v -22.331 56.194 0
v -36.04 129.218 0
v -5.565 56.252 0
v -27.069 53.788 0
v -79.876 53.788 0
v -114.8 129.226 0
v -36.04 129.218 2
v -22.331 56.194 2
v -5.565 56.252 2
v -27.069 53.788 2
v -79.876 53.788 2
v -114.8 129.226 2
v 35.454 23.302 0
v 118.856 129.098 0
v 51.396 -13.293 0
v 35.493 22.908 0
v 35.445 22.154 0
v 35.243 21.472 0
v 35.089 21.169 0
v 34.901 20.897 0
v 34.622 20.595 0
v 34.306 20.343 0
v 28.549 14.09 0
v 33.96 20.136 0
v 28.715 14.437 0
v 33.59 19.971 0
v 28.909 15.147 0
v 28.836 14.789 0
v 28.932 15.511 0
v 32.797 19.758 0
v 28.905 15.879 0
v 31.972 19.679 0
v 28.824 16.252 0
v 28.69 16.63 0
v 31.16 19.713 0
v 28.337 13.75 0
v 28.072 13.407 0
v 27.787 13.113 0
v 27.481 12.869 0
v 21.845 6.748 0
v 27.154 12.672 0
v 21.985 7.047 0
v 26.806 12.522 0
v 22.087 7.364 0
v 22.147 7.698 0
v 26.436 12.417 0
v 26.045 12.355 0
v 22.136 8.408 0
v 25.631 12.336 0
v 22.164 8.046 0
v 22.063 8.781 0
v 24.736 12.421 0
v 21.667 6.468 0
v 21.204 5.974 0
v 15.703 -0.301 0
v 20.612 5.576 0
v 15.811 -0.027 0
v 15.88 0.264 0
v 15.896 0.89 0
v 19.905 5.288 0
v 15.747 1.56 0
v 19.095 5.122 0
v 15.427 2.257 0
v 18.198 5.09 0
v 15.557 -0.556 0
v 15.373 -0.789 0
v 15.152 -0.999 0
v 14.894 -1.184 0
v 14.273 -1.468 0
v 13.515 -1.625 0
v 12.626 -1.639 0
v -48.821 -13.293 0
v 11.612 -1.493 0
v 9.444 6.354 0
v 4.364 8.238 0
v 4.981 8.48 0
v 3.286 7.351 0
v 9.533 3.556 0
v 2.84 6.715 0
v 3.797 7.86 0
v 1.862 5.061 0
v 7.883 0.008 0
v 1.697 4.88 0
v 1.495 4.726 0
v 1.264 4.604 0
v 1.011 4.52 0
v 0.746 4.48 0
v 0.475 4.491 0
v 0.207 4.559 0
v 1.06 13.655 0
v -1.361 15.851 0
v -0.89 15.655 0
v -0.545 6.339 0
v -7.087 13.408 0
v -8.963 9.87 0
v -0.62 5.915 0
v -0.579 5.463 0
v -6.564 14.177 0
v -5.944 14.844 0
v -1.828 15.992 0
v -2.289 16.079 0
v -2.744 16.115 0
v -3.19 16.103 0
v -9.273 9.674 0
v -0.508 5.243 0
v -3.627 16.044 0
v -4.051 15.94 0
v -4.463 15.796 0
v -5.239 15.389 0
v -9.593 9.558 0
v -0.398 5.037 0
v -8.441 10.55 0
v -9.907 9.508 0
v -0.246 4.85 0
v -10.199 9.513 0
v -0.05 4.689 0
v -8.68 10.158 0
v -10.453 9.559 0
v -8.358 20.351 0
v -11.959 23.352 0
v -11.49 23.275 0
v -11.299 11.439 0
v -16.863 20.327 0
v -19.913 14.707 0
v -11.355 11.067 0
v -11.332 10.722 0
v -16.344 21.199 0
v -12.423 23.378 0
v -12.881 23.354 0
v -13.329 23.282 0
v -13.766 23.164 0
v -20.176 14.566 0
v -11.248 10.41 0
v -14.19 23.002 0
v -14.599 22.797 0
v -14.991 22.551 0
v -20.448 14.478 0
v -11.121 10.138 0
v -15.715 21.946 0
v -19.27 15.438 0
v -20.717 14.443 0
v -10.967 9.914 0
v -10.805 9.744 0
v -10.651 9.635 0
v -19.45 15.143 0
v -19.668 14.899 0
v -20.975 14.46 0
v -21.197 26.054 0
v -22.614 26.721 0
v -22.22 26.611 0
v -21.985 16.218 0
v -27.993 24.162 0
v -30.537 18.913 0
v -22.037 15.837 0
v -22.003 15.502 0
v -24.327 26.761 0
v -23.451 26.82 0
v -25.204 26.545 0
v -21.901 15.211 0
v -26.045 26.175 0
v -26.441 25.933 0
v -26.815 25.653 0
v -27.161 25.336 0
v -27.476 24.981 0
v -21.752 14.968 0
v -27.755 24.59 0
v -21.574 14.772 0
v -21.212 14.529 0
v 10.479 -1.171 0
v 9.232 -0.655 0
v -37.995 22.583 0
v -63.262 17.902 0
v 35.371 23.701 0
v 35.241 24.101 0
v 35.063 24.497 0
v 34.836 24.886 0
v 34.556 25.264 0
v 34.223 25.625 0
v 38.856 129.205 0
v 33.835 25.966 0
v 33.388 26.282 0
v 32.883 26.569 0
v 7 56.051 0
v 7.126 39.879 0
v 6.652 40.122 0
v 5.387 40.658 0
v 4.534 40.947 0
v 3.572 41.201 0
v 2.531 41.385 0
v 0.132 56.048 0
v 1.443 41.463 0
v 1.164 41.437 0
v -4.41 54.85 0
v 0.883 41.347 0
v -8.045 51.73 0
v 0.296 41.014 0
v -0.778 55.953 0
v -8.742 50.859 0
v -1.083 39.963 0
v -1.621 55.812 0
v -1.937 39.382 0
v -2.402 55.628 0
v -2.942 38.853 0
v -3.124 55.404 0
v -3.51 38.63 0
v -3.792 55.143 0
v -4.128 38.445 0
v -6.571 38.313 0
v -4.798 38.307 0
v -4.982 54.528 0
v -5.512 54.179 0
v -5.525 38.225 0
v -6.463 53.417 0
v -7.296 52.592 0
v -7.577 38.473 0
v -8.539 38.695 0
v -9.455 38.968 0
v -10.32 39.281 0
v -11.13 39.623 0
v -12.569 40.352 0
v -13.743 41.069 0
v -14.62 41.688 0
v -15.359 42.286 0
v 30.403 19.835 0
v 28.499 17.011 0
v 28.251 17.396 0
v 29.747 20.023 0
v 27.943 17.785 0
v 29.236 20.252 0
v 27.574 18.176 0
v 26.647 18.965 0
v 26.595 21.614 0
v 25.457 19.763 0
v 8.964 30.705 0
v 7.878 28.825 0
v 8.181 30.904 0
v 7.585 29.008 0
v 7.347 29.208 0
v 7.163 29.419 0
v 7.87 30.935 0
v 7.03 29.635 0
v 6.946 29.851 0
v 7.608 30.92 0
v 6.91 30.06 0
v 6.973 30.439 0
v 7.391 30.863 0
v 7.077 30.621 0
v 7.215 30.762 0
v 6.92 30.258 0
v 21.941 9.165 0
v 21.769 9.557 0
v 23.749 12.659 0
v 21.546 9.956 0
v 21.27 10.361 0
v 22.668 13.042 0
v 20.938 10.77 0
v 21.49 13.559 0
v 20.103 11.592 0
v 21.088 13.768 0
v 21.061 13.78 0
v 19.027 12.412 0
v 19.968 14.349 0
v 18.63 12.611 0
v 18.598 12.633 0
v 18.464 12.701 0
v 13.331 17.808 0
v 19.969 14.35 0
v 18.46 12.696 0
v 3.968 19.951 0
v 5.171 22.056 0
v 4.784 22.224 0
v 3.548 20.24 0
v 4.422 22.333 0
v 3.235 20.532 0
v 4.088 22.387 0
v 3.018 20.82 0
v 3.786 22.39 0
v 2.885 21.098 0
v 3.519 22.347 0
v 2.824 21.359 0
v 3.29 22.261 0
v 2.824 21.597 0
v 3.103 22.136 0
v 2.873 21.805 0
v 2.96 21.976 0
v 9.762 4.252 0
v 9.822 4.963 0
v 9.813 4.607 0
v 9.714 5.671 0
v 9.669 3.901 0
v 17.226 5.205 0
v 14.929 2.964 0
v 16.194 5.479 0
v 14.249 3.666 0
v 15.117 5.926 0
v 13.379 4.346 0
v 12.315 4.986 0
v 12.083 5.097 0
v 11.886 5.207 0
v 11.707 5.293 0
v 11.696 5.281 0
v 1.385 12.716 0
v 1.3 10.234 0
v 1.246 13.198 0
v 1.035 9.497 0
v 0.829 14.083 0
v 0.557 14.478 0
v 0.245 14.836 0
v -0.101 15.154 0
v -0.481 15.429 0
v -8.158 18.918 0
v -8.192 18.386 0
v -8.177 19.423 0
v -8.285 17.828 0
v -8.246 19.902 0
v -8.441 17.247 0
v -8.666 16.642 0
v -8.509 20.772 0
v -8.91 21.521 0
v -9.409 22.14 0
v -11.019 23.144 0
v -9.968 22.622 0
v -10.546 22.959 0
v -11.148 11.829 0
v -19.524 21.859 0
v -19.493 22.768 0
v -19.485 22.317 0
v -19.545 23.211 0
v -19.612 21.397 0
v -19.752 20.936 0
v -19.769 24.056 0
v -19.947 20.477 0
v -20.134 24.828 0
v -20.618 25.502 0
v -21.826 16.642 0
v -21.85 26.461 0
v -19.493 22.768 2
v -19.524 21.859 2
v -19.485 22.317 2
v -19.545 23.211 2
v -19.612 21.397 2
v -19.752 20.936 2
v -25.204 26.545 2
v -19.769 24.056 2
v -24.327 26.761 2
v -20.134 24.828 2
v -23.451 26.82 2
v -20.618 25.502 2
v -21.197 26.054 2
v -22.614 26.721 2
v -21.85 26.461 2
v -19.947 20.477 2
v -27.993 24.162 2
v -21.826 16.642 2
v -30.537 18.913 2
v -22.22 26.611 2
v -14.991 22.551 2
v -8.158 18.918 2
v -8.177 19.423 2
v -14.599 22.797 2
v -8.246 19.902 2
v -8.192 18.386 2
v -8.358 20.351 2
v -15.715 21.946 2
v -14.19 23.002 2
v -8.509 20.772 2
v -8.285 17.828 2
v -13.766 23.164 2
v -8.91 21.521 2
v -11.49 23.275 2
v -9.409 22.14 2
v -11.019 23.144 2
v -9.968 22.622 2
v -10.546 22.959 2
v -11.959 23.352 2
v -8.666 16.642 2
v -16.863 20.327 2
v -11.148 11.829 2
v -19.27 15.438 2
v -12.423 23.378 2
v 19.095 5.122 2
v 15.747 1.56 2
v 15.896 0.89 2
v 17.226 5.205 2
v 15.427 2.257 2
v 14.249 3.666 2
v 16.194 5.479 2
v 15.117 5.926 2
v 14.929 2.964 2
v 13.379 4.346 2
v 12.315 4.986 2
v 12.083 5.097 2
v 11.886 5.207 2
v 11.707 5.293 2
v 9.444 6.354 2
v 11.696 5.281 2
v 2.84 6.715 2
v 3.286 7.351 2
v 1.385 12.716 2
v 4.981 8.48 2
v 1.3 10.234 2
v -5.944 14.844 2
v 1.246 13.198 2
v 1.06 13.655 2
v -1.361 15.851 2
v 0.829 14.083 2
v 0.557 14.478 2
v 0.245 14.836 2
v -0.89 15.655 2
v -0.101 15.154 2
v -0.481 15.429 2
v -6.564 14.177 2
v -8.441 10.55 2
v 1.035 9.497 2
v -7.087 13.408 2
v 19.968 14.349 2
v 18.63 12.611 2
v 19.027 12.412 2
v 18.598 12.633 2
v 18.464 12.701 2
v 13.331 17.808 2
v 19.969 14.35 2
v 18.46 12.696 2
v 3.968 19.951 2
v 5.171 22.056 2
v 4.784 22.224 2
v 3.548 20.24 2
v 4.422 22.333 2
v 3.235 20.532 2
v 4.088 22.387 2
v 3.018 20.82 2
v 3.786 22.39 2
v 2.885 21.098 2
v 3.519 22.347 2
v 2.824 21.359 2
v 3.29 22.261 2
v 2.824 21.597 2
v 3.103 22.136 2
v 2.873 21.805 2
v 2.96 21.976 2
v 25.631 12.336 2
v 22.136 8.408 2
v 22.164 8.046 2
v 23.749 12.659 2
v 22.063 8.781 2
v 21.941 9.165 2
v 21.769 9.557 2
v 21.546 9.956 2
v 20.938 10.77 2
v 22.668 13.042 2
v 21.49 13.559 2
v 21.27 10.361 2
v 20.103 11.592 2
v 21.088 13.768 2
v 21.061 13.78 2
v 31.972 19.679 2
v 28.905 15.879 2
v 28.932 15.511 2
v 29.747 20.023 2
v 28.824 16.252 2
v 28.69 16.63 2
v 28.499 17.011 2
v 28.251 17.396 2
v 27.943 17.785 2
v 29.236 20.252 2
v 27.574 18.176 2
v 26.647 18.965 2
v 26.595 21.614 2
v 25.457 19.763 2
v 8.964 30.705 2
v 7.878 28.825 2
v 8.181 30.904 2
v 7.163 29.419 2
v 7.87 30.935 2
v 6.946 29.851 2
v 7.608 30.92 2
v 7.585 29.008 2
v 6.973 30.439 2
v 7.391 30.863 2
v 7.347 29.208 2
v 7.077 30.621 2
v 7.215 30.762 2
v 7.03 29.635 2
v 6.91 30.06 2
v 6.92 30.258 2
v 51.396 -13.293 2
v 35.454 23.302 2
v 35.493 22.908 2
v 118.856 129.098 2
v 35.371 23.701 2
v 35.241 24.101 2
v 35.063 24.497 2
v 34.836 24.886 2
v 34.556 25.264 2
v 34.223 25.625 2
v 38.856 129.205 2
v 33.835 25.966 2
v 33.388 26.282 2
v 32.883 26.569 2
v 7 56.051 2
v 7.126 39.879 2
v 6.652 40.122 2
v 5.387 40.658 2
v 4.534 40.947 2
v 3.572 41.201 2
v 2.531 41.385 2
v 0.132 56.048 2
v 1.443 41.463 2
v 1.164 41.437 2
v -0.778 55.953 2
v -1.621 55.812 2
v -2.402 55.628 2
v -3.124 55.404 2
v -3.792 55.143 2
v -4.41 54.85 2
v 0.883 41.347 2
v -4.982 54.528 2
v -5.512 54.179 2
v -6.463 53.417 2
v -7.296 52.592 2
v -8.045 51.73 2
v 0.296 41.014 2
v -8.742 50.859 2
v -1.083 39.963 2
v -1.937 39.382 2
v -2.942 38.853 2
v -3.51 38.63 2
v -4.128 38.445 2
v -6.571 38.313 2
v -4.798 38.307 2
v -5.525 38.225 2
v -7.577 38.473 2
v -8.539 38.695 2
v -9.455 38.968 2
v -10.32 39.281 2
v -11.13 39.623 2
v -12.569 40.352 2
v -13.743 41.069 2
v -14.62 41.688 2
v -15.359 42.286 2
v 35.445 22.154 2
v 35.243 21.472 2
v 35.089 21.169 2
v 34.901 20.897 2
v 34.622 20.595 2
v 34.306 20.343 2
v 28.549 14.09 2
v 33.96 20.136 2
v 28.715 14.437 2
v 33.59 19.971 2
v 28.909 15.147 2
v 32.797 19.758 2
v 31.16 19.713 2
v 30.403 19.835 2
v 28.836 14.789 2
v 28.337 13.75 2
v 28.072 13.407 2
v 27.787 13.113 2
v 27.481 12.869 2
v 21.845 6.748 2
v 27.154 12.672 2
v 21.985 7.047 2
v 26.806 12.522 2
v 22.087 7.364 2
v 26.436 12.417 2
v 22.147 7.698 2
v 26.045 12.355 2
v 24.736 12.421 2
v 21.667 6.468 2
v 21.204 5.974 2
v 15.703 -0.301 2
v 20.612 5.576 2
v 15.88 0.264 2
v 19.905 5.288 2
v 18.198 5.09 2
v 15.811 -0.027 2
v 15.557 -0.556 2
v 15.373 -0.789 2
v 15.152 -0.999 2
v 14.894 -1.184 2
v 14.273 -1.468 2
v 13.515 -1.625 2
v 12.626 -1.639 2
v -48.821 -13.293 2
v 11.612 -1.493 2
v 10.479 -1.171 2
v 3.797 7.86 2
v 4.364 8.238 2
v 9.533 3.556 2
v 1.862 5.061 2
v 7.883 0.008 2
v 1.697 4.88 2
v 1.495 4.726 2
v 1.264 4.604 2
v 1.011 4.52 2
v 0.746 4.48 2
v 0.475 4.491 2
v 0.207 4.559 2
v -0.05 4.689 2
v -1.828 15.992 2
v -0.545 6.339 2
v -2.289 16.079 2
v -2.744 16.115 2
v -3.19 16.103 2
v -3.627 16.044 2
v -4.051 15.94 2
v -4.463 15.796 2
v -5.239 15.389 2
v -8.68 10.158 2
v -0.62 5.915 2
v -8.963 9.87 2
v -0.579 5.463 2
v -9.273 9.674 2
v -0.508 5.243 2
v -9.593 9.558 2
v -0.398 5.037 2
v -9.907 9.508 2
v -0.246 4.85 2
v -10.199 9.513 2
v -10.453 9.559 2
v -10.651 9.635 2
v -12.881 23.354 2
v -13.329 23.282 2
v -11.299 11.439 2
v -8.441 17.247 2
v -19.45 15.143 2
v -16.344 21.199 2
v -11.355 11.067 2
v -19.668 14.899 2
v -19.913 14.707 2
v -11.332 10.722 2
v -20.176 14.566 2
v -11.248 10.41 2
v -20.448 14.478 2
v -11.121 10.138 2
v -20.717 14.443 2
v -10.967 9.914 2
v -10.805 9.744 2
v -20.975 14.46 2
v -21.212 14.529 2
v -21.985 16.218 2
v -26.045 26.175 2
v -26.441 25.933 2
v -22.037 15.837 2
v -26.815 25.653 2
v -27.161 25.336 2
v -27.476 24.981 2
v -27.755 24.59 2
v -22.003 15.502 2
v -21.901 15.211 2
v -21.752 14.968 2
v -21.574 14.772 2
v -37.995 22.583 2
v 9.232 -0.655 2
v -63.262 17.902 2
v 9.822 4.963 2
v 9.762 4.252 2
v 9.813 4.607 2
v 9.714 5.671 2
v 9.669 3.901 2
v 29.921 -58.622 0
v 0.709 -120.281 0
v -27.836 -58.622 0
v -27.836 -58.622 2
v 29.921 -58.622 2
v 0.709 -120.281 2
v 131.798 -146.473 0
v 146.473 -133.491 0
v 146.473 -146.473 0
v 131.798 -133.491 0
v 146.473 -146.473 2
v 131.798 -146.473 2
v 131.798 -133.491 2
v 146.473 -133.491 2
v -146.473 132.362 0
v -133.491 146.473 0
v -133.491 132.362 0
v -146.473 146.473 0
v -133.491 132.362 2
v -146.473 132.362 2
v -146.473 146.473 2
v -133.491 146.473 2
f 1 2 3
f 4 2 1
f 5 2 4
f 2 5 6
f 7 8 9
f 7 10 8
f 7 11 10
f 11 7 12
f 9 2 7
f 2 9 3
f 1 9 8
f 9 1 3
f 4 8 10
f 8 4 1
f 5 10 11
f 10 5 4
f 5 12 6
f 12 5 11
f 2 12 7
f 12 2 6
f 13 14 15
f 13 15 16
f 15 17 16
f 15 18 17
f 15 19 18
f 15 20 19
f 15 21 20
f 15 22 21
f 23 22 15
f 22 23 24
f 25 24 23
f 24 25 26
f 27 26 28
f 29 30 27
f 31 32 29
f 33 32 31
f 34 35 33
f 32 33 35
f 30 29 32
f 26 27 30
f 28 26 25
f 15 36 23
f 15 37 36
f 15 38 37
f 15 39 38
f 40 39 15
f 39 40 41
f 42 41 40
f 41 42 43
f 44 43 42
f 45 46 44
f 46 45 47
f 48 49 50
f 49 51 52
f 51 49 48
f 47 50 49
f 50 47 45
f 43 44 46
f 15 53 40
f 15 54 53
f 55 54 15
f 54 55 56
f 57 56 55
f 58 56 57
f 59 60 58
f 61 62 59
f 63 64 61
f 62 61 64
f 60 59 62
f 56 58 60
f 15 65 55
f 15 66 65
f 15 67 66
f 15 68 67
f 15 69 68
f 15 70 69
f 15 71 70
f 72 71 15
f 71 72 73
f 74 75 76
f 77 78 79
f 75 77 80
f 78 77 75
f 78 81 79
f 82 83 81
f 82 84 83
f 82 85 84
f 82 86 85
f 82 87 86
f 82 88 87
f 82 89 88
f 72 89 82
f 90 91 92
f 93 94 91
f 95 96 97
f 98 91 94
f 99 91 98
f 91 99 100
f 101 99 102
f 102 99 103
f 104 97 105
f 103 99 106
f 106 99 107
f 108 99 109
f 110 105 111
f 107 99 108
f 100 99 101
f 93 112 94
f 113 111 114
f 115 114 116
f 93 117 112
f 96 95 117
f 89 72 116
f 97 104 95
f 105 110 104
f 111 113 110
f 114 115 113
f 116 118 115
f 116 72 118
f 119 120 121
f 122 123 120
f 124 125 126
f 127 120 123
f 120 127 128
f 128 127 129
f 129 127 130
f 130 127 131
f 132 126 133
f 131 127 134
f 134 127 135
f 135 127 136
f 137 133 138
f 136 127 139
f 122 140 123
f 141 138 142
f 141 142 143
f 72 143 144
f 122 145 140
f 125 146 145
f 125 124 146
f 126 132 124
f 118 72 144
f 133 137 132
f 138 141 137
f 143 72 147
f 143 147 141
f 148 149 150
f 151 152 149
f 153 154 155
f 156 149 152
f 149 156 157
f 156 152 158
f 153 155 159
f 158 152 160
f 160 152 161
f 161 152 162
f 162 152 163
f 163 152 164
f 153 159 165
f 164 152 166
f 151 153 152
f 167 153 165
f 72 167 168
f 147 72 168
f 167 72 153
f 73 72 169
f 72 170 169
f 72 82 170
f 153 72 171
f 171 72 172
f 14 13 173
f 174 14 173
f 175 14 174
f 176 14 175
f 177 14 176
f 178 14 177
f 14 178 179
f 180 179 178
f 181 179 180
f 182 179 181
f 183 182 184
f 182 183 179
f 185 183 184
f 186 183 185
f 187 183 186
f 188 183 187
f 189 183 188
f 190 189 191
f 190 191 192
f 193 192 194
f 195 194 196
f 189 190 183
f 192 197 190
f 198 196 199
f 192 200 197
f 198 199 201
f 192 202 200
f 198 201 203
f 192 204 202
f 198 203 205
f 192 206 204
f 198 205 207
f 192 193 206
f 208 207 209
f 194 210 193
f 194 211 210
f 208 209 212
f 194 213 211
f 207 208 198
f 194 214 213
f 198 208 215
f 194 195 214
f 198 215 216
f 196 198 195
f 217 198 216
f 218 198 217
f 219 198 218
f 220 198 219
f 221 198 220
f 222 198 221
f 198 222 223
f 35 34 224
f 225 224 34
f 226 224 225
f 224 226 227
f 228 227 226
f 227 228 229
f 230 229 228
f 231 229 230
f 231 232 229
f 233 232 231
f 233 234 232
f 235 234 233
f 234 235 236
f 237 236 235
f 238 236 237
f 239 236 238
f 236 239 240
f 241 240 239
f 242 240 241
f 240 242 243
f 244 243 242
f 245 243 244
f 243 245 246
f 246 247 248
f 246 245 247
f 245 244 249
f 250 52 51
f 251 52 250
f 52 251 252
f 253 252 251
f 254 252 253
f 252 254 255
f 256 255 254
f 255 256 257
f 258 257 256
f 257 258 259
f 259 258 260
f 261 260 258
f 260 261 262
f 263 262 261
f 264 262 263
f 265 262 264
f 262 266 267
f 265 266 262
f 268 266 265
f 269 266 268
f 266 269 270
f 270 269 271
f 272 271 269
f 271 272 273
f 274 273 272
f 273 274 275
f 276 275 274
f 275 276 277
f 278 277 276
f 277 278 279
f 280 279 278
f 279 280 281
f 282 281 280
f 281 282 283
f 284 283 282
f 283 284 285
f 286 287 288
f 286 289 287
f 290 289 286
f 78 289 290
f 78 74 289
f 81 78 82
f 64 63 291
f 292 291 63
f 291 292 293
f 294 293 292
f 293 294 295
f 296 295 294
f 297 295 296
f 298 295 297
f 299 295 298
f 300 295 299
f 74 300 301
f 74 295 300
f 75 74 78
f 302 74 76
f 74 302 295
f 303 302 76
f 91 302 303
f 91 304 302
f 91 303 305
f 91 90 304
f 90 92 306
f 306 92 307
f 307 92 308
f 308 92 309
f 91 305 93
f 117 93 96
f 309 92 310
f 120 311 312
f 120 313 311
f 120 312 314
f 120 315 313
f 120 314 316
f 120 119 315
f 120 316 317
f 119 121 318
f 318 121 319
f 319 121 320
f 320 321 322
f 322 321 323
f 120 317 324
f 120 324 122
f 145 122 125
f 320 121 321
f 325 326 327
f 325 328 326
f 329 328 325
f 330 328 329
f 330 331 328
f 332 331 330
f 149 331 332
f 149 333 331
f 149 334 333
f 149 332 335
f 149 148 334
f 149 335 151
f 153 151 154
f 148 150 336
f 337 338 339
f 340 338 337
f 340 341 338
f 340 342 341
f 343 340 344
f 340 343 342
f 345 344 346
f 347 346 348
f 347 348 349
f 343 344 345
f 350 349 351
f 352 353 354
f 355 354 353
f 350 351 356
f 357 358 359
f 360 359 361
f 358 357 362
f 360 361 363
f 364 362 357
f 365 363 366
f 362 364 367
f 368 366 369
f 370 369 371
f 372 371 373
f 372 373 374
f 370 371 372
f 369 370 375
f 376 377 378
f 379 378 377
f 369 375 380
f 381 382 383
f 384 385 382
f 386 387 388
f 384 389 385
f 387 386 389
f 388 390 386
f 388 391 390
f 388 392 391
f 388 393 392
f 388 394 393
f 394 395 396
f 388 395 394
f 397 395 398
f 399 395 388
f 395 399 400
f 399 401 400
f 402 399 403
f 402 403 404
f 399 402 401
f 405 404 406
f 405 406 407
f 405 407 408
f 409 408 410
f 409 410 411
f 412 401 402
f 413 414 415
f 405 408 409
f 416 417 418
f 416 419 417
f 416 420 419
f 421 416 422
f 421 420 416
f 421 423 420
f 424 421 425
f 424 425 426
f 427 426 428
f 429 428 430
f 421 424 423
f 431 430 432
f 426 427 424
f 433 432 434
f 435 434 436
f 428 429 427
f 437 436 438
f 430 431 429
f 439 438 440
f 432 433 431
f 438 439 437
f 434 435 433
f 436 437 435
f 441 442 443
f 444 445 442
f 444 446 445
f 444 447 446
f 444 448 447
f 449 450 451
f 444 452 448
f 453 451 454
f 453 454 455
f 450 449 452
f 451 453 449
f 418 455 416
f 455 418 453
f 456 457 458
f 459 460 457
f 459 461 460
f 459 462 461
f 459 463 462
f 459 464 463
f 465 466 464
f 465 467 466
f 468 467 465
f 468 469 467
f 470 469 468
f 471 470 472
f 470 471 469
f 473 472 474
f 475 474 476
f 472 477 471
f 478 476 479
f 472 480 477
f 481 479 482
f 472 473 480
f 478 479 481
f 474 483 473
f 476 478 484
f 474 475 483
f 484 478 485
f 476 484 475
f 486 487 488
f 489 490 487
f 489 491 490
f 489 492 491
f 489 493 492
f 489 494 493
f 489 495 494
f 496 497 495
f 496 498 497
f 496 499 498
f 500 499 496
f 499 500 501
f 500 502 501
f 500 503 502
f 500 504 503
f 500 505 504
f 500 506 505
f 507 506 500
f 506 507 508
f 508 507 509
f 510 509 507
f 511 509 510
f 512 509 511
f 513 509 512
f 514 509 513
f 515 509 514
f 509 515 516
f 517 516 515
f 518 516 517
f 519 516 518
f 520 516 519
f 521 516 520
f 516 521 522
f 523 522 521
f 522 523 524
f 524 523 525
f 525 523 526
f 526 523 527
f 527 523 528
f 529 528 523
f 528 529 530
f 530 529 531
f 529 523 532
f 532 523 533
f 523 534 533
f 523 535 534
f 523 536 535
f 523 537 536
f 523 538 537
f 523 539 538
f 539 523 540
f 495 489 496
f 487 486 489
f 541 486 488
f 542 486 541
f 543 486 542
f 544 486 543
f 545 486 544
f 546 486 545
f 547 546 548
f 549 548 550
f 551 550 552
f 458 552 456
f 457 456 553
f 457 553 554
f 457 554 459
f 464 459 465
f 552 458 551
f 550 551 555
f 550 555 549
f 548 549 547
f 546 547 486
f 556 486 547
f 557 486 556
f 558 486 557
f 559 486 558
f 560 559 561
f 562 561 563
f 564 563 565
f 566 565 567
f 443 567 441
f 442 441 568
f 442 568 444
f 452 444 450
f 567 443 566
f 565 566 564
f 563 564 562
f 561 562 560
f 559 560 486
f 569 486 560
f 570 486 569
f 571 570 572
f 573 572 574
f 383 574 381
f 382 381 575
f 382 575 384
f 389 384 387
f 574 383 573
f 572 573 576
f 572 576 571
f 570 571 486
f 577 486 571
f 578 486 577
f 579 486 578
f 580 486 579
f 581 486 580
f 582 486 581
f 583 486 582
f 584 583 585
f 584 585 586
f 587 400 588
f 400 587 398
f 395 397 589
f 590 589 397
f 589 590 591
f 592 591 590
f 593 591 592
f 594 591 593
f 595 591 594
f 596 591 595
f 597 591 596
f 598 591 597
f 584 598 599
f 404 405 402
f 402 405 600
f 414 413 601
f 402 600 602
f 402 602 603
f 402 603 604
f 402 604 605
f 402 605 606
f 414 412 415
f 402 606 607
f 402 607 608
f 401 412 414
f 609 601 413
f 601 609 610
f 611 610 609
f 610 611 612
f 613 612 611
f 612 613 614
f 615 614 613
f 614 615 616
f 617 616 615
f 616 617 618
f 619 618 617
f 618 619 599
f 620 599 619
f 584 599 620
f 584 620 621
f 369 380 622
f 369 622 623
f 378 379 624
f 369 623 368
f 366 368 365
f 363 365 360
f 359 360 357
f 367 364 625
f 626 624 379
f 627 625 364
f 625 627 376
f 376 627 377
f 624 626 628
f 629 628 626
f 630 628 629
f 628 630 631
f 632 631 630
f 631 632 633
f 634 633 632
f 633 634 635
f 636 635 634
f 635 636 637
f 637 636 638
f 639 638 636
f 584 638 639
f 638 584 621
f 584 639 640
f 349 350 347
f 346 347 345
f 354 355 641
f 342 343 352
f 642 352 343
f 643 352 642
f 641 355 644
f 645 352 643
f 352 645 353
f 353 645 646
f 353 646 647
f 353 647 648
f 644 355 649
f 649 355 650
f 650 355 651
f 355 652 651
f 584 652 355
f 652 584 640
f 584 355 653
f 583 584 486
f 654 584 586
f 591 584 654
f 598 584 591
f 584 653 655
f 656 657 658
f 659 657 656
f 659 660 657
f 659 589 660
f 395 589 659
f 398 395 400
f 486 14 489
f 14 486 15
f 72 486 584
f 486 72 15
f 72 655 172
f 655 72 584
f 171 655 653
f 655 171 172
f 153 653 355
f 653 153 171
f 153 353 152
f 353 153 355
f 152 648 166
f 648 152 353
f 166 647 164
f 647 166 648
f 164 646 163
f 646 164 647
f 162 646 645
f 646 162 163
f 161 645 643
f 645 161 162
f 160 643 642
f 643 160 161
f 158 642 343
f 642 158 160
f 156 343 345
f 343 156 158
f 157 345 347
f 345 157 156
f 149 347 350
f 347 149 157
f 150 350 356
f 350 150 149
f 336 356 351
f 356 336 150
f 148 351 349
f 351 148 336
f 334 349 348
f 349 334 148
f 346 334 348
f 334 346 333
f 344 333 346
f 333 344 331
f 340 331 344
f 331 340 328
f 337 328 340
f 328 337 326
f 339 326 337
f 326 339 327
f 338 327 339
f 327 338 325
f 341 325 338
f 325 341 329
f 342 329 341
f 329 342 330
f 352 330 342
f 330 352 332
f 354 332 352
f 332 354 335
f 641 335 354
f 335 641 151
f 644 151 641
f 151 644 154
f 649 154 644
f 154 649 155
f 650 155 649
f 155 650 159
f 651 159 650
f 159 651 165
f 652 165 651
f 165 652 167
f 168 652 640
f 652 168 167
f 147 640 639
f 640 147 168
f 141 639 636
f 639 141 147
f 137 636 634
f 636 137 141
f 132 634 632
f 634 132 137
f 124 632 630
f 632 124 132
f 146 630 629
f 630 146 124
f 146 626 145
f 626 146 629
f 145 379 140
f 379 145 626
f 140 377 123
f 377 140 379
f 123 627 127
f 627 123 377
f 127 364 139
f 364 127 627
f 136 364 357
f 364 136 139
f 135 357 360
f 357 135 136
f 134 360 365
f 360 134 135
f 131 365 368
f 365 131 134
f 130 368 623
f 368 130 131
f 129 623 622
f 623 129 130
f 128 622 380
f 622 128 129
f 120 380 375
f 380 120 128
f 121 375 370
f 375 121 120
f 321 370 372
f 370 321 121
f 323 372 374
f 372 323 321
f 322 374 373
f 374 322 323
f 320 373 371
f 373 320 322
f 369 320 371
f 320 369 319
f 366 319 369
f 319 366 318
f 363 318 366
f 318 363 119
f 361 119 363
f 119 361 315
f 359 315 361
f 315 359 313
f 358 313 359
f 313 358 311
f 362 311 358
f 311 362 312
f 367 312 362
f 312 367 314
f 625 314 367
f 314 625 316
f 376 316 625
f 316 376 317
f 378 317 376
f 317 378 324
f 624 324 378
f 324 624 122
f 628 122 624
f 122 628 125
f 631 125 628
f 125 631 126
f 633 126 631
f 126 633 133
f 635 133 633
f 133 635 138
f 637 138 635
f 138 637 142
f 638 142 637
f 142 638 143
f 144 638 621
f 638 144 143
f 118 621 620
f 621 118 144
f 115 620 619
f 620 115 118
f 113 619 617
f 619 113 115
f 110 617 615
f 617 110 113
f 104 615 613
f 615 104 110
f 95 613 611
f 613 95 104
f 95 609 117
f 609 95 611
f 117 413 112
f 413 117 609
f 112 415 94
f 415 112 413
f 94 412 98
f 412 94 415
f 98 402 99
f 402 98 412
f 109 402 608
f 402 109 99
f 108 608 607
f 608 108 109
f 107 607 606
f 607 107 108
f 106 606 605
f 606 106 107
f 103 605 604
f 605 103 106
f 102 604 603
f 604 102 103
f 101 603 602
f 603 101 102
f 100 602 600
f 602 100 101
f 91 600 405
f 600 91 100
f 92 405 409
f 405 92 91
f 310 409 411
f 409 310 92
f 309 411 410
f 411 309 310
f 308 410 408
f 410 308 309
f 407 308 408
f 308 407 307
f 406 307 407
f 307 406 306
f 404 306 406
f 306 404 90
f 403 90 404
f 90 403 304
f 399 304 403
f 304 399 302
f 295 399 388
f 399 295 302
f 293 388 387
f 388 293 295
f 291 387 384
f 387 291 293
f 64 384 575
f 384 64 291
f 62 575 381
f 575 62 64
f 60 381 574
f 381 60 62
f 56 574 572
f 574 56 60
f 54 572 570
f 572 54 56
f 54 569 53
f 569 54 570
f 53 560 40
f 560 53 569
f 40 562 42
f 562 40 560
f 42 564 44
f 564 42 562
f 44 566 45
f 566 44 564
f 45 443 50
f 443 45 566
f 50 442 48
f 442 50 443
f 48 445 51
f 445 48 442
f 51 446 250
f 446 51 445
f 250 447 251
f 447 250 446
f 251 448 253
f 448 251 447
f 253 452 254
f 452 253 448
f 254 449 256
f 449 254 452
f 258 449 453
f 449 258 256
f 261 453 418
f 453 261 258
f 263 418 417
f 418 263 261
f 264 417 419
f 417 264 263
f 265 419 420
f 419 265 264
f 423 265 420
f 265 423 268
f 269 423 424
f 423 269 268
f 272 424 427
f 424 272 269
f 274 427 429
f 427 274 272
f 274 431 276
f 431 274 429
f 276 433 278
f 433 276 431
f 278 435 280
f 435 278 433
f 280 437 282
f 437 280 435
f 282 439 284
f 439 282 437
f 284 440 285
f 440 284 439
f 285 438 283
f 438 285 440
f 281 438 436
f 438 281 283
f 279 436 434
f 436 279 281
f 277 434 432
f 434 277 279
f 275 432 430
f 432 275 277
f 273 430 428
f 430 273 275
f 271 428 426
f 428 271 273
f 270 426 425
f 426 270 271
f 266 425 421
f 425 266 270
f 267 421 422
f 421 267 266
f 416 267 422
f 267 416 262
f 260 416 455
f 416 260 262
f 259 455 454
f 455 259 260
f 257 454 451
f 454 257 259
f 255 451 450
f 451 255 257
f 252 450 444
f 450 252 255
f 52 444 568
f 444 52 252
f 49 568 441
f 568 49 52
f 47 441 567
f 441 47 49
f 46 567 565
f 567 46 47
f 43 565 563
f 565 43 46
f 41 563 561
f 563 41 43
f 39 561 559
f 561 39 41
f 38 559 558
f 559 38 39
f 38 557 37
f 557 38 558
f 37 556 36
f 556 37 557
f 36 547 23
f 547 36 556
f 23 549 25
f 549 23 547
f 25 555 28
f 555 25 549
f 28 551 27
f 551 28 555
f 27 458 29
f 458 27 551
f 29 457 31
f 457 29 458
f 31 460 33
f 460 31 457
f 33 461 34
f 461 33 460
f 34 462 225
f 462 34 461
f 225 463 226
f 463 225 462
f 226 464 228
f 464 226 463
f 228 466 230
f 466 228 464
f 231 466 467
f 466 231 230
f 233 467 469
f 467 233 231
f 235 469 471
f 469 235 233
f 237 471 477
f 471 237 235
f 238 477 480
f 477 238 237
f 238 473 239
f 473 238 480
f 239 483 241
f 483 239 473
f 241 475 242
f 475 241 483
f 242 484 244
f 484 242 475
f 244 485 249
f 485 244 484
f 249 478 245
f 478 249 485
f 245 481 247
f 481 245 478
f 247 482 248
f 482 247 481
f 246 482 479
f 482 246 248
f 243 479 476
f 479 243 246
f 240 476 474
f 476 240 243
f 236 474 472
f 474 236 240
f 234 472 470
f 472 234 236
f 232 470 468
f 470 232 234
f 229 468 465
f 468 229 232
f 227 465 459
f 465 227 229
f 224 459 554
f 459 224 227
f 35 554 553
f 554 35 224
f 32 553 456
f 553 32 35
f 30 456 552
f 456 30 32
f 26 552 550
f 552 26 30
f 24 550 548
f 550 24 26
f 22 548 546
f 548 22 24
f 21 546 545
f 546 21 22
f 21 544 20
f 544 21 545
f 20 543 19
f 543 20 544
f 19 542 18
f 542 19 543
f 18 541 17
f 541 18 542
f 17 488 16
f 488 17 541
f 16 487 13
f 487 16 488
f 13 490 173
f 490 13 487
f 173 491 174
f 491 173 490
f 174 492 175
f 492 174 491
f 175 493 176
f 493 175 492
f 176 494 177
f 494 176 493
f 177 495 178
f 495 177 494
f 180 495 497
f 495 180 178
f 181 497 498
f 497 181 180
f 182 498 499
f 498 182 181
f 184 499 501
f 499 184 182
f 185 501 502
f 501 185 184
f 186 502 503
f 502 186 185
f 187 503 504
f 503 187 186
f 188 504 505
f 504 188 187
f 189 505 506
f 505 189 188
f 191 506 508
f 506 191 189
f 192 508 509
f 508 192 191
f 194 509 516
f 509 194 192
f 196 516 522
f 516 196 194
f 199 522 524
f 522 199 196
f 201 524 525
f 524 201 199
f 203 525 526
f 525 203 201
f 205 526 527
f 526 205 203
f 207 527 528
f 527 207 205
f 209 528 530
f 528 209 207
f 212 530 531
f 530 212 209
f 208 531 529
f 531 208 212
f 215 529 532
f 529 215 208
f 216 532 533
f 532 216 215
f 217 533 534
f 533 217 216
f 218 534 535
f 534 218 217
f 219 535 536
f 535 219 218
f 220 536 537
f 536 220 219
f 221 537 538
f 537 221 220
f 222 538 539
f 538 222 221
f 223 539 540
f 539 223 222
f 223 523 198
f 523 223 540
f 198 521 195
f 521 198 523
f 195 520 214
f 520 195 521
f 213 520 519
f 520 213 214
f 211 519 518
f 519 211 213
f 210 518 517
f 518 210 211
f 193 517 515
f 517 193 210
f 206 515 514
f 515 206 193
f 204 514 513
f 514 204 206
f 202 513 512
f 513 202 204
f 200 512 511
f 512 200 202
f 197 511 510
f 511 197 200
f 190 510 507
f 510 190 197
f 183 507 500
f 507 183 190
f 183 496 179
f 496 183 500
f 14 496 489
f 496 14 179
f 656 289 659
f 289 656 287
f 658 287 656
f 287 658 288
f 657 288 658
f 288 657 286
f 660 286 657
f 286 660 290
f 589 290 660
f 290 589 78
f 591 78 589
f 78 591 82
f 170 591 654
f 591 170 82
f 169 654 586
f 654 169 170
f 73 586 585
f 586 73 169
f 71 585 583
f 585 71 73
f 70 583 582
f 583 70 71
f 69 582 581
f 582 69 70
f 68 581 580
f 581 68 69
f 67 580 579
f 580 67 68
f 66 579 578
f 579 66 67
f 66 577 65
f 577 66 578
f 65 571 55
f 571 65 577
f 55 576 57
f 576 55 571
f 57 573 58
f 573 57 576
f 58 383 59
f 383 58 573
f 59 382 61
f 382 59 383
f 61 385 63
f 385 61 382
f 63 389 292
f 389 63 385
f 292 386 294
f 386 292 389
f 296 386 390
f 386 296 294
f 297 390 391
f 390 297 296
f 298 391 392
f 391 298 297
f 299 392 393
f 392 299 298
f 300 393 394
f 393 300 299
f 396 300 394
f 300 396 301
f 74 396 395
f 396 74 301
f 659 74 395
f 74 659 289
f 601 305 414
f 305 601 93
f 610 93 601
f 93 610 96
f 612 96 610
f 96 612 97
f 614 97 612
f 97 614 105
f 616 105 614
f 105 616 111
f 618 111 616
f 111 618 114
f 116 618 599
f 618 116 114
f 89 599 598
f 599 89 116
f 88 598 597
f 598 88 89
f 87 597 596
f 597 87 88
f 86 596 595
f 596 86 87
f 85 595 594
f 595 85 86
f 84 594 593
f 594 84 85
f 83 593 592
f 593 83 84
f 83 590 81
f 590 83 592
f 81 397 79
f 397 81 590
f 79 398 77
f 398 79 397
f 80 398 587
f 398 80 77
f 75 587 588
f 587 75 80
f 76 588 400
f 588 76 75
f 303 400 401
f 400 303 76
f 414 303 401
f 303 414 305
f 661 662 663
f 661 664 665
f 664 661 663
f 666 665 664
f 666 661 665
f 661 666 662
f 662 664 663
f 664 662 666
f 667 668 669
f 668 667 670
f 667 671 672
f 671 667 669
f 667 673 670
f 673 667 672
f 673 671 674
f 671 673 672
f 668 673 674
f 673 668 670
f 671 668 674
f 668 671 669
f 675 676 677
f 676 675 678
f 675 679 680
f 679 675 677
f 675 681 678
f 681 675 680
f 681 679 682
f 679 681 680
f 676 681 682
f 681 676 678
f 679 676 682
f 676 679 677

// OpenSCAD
// Module names are of the form poly_<inkscape-path-id>().
// As a result you can associate a polygon in this OpenSCAD program with the
//  corresponding SVG element in the Inkscape document by looking for 
//  the XML element with the attribute id="inkscape-path-id".

// Paths have their own variables so they can be imported and used 
//  in polygon(points) structures in other programs.
// The NN_points is the list of all polygon XY vertices. 
// There may be an NN_paths variable as well. If it exists then it 
//  defines the nested paths. Both must be used in the 
//  polygon(points, paths) variant of the command.

profile_scale = 25.4/90; //made in inkscape in mm

// helper functions to determine the X,Y dimensions of the profiles
function min_x(shape_points) = min([ for (x = shape_points) min(x[0])]);
function max_x(shape_points) = max([ for (x = shape_points) max(x[0])]);
function min_y(shape_points) = min([ for (x = shape_points) min(x[1])]);
function max_y(shape_points) = max([ for (x = shape_points) max(x[1])]);

height = 2;
width = 1.0;


rect1031_0_points = [[467.000000,472.999998],[519.000000,472.999998],[519.000000,518.999998],[467.000000,518.999998],[467.000000,472.999998]];

module poly_rect1031(h, w, res=4)  {
  scale([profile_scale, -profile_scale, 1])
  union()  {
    linear_extrude(height=h)
      polygon(rect1031_0_points);
  }
}

rect1033_0_points = [[-519.000000,-518.999998],[-473.000000,-518.999998],[-473.000000,-468.999998],[-519.000000,-468.999998],[-519.000000,-518.999998]];

module poly_rect1033(h, w, res=4)  {
  scale([profile_scale, -profile_scale, 1])
  union()  {
    linear_extrude(height=h)
      polygon(rect1033_0_points);
  }
}

path45873_0_points = [[-406.771484,-457.888674],[-283.023440,-190.585942],[-95.912110,-190.585942],[-79.125000,-199.113282],[-19.718750,-199.316412],[-127.701170,-457.859377],[-406.771484,-457.888674],[-406.771484,-457.888674]];
path45873_1_points = [[137.679690,-457.812502],[24.802730,-198.607422],[0.468750,-198.595702],[-2.755678,-198.259616],[-5.743789,-197.758989],[-8.510245,-197.105848],[-11.069708,-196.312221],[-13.436839,-195.390137],[-15.626300,-194.351623],[-17.652753,-193.208707],[-19.530859,-191.973417],[-22.900676,-189.273827],[-25.853045,-186.349076],[-28.505259,-183.295387],[-30.974610,-180.208982],[-54.421880,-149.832032],[-51.804015,-147.711645],[-48.696732,-145.519071],[-44.537260,-142.978610],[-39.435630,-140.395534],[-36.565891,-139.183414],[-33.501875,-138.075119],[-30.257336,-137.108806],[-26.846027,-136.322637],[-23.281704,-135.754769],[-19.578120,-135.443362],[-17.000974,-135.735080],[-14.625291,-136.223356],[-12.437444,-136.878221],[-10.423809,-137.669709],[-6.864666,-139.542685],[-3.838850,-141.602542],[1.048837,-145.323951],[3.128727,-146.506023],[4.125377,-146.822515],[5.111330,-146.916022],[8.969288,-146.639453],[12.655323,-145.987151],[16.063878,-145.086290],[19.089399,-144.064045],[23.569108,-142.164096],[25.250000,-141.304692],[116.513670,-94.140622],[118.305030,-93.123609],[119.886092,-92.003912],[121.263512,-90.796704],[122.443942,-89.517159],[123.434038,-88.180448],[124.240452,-86.801743],[124.869839,-85.396217],[125.328854,-83.979042],[125.624149,-82.565391],[125.762379,-81.170436],[125.594261,-78.497303],[124.877730,-76.081022],[124.330446,-75.007132],[123.666020,-74.042972],[122.674652,-72.976069],[121.556677,-72.080671],[120.331704,-71.346430],[119.019340,-70.762997],[116.210872,-70.007160],[113.288136,-69.730367],[110.407998,-69.849828],[107.727320,-70.282750],[105.402966,-70.946342],[103.591800,-71.757812],[94.234380,-76.583982],[31.761720,-108.796882],[28.987165,-109.502979],[27.885413,-109.610857],[26.956581,-109.560520],[26.187595,-109.355890],[25.565382,-109.000890],[25.076868,-108.499443],[24.708980,-107.855472],[24.519990,-107.214291],[24.485759,-106.512583],[24.613140,-105.770055],[24.908986,-105.006410],[25.380149,-104.241354],[26.033480,-103.494593],[26.875833,-102.785830],[27.914060,-102.134772],[90.201170,-70.025392],[94.420218,-67.200318],[97.704423,-64.402041],[99.010637,-63.015996],[100.100754,-61.640303],[100.980645,-60.276181],[101.656180,-58.924847],[102.133231,-57.587520],[102.417669,-56.265417],[102.515365,-54.959756],[102.432190,-53.671754],[102.174015,-52.402630],[101.746711,-51.153602],[101.156149,-49.925886],[100.408200,-48.720702],[99.469106,-47.503779],[98.457905,-46.464798],[97.373551,-45.599188],[96.215000,-44.902377],[94.981205,-44.369795],[93.671122,-43.996869],[92.283707,-43.779028],[90.817913,-43.711700],[87.647009,-44.010298],[84.150052,-44.856091],[80.318679,-46.212507],[76.144530,-48.042972],[74.720700,-48.785162],[74.625000,-48.828122],[70.753910,-50.843752],[70.757810,-50.847662],[47.234380,-63.097662],[18.322270,-78.152342],[16.950985,-78.745718],[15.668369,-79.131285],[14.486093,-79.323086],[13.415826,-79.335167],[12.469241,-79.181574],[11.658008,-78.876350],[10.993797,-78.433541],[10.488280,-77.867192],[10.179627,-77.260441],[10.004877,-76.524338],[10.004929,-75.682099],[10.220677,-74.756940],[10.693021,-73.772076],[11.462856,-72.750723],[12.571080,-71.716097],[14.058590,-70.691412],[65.408200,-44.984382],[65.423830,-45.001952],[65.898440,-44.763672],[66.011720,-44.683592],[67.417970,-43.978522],[71.231043,-41.074763],[74.190109,-38.159950],[75.364801,-36.712241],[76.344484,-35.278378],[77.135322,-33.863898],[77.743481,-32.474338],[78.175123,-31.115235],[78.436415,-29.792124],[78.533519,-28.510544],[78.472600,-27.276030],[78.259823,-26.094119],[77.901352,-24.970347],[77.403351,-23.910252],[76.771985,-22.919370],[75.133813,-21.167390],[73.036151,-19.758702],[70.528313,-18.737598],[67.659614,-18.148371],[64.479369,-18.035313],[61.036892,-18.442719],[57.381497,-19.414881],[53.562500,-20.996092],[4.906250,-45.056642],[4.415967,-46.764596],[3.756412,-48.383146],[2.938357,-49.898967],[1.972577,-51.298732],[0.869845,-52.569115],[-0.359068,-53.696789],[-1.703387,-54.668427],[-3.152340,-55.470702],[-4.820709,-56.166044],[-6.475752,-56.664117],[-8.111870,-56.973109],[-9.723462,-57.101210],[-11.304929,-57.056610],[-12.850672,-56.847496],[-14.355090,-56.482059],[-15.812585,-55.968487],[-18.564404,-54.529698],[-21.061333,-52.596640],[-23.258574,-50.234827],[-25.111330,-47.509772],[-29.908200,-37.382812],[-30.756858,-35.993422],[-31.758791,-34.973720],[-32.855982,-34.279451],[-33.990415,-33.866359],[-35.104073,-33.690186],[-36.138939,-33.706677],[-37.036997,-33.871574],[-37.740230,-34.140622],[-38.285622,-34.524512],[-38.861082,-35.126735],[-39.405087,-35.922094],[-39.856115,-36.885392],[-40.152643,-37.991435],[-40.233148,-39.215025],[-40.036108,-40.530966],[-39.500000,-41.914062],[-30.707030,-58.966802],[-29.910634,-61.110659],[-29.356419,-63.171718],[-29.027140,-65.146439],[-28.905551,-67.031279],[-28.974408,-68.822697],[-29.216466,-70.517152],[-29.614479,-72.111103],[-30.151203,-73.601007],[-31.571799,-76.254512],[-33.340295,-78.449336],[-35.318729,-80.157146],[-37.369140,-81.349612],[-39.042540,-82.008011],[-40.713648,-82.470882],[-42.375113,-82.744660],[-44.019584,-82.835778],[-45.639711,-82.750669],[-47.228142,-82.495767],[-48.777526,-82.077504],[-50.280512,-81.502315],[-51.729750,-80.776632],[-53.117887,-79.906890],[-55.681457,-77.760958],[-57.912414,-75.115987],[-59.751950,-72.023442],[-68.279300,-54.703122],[-68.917787,-53.655694],[-69.689064,-52.791097],[-70.558398,-52.110035],[-71.491051,-51.613214],[-72.452290,-51.301337],[-73.407378,-51.175110],[-74.321580,-51.235237],[-75.160160,-51.482422],[-76.444374,-52.342861],[-77.074117,-53.035719],[-77.603574,-53.898350],[-77.963712,-54.926763],[-78.085499,-56.116970],[-77.899902,-57.464979],[-77.337890,-58.966802],[-70.677730,-72.556642],[-69.986062,-74.182060],[-69.489580,-75.817368],[-69.178263,-77.451870],[-69.042092,-79.074869],[-69.071046,-80.675667],[-69.255104,-82.243566],[-70.048450,-85.237882],[-71.341965,-87.972239],[-73.055485,-90.361058],[-75.108845,-92.318762],[-77.421880,-93.759772],[-78.733650,-94.292212],[-80.127290,-94.681220],[-83.095571,-95.032843],[-86.197509,-94.822444],[-89.303885,-94.057827],[-92.285484,-92.746799],[-93.689112,-91.888819],[-95.013089,-90.897162],[-96.241263,-89.772805],[-97.357483,-88.516722],[-98.345596,-87.129889],[-99.189450,-85.613282],[-108.203120,-67.015622],[-134.628910,-80.017582],[-224.158200,-63.433592],[-172.986330,47.101558],[182.111330,47.101558],[421.144530,-457.435549],[137.679690,-457.812502],[137.679690,-457.812502],[4.605470,-36.263672],[17.648440,-30.048832],[15.462067,-29.189294],[13.452382,-27.849470],[11.644242,-26.045362],[10.062500,-23.792972],[6.597660,-17.931642],[6.013668,-17.292316],[5.297546,-16.745080],[4.477832,-16.311715],[3.583064,-16.014000],[2.641780,-15.873715],[1.682520,-15.912639],[0.733820,-16.152551],[-0.175780,-16.615232],[-0.872229,-17.184500],[-1.409604,-17.847000],[-1.799268,-18.579180],[-2.052586,-19.357487],[-2.195643,-20.958275],[-1.929690,-22.460942],[3.666020,-33.652342],[4.605470,-36.263672],[4.605470,-36.263672],[33.462890,-22.513672],[41.443360,-18.710942],[41.482420,-18.753912],[42.117190,-18.451172],[42.812500,-18.058592],[43.636720,-17.666022],[47.406773,-15.397510],[50.487388,-12.990575],[52.899076,-10.504005],[54.662348,-7.996586],[55.797714,-5.527106],[56.325684,-3.154350],[56.266769,-0.937105],[56.023640,0.094830],[55.641480,1.065843],[55.122854,1.968584],[54.470327,2.795705],[53.686461,3.539859],[52.773820,4.193697],[50.572470,5.201032],[47.886787,5.758922],[44.737282,5.808581],[41.144466,5.291223],[37.128848,4.148060],[32.710940,2.320308],[27.933590,-0.029302],[33.777340,-12.601562],[34.260610,-13.821550],[34.591105,-15.064858],[34.770559,-16.322543],[34.800705,-17.585664],[34.420010,-20.092447],[33.462890,-22.513672],[33.462890,-22.513672]];
path45873_1_paths = [[0,1,2,3,4,5,6,7,8,9,10,11,12,13,14,15,16,17,18,19,20,21,22,23,24,25,26,27,28,29,30,31,32,33,34,35,36,37,38,39,40,41,42,43,44,45,46,47,48,49,50,51,52,53,54,55,56,57,58,59,60,61,62,63,64,65,66,67,68,69,70,71,72,73,74,75,76,77,78,79,80,81,82,83,84,85,86,87,88,89,90,91,92,93,94,95,96,97,98,99,100,101,102,103,104,105,106,107,108,109,110,111,112,113,114,115,116,117,118,119,120,121,122,123,124,125,126,127,128,129,130,131,132,133,134,135,136,137,138,139,140,141,142,143,144,145,146,147,148,149,150,151,152,153,154,155,156,157,158,159,160,161,162,163,164,165,166,167,168,169,170,171,172,173,174,175,176,177,178,179,180,181,182,183,184,185,186,187,188,189,190,191,192,193,194,195,196,197,198,199,200,201,202,203,204,205,206,207,208,209,210,211,212,213,214,215,216,217,218,219,220,221,222,223,224,225,226,227,228,229,230,231,232,233,234,235,236,237,238,239,240,241,242,243,244,245,246,247,248,249,250,251,252,253,254,255,256,257,258,259,260,261,262,263,264,265,266,267,268,269,270,271],
				[272,273,274,275,276,277,278,279,280,281,282,283,284,285,286,287,288,289,290,291,292,293,294,295],
				[296,297,298,299,300,301,302,303,304,305,306,307,308,309,310,311,312,313,314,315,316,317,318,319,320,321,322,323,324,325,326,327,328,329]];
path45873_2_points = [[-98.630860,207.716798],[2.511720,426.191408],[106.017580,207.716798],[-98.630860,207.716798],[-98.630860,207.716798]];

module poly_path45873(h, w, res=4)  {
  scale([profile_scale, -profile_scale, 1])
  union()  {
    linear_extrude(height=h)
      polygon(path45873_0_points);
    linear_extrude(height=h)
      polygon(path45873_1_points, path45873_1_paths);
    linear_extrude(height=h)
      polygon(path45873_2_points);
  }
}

// The shapes
poly_rect1031(height, width);
poly_rect1033(height, width);
poly_path45873(height, width);
